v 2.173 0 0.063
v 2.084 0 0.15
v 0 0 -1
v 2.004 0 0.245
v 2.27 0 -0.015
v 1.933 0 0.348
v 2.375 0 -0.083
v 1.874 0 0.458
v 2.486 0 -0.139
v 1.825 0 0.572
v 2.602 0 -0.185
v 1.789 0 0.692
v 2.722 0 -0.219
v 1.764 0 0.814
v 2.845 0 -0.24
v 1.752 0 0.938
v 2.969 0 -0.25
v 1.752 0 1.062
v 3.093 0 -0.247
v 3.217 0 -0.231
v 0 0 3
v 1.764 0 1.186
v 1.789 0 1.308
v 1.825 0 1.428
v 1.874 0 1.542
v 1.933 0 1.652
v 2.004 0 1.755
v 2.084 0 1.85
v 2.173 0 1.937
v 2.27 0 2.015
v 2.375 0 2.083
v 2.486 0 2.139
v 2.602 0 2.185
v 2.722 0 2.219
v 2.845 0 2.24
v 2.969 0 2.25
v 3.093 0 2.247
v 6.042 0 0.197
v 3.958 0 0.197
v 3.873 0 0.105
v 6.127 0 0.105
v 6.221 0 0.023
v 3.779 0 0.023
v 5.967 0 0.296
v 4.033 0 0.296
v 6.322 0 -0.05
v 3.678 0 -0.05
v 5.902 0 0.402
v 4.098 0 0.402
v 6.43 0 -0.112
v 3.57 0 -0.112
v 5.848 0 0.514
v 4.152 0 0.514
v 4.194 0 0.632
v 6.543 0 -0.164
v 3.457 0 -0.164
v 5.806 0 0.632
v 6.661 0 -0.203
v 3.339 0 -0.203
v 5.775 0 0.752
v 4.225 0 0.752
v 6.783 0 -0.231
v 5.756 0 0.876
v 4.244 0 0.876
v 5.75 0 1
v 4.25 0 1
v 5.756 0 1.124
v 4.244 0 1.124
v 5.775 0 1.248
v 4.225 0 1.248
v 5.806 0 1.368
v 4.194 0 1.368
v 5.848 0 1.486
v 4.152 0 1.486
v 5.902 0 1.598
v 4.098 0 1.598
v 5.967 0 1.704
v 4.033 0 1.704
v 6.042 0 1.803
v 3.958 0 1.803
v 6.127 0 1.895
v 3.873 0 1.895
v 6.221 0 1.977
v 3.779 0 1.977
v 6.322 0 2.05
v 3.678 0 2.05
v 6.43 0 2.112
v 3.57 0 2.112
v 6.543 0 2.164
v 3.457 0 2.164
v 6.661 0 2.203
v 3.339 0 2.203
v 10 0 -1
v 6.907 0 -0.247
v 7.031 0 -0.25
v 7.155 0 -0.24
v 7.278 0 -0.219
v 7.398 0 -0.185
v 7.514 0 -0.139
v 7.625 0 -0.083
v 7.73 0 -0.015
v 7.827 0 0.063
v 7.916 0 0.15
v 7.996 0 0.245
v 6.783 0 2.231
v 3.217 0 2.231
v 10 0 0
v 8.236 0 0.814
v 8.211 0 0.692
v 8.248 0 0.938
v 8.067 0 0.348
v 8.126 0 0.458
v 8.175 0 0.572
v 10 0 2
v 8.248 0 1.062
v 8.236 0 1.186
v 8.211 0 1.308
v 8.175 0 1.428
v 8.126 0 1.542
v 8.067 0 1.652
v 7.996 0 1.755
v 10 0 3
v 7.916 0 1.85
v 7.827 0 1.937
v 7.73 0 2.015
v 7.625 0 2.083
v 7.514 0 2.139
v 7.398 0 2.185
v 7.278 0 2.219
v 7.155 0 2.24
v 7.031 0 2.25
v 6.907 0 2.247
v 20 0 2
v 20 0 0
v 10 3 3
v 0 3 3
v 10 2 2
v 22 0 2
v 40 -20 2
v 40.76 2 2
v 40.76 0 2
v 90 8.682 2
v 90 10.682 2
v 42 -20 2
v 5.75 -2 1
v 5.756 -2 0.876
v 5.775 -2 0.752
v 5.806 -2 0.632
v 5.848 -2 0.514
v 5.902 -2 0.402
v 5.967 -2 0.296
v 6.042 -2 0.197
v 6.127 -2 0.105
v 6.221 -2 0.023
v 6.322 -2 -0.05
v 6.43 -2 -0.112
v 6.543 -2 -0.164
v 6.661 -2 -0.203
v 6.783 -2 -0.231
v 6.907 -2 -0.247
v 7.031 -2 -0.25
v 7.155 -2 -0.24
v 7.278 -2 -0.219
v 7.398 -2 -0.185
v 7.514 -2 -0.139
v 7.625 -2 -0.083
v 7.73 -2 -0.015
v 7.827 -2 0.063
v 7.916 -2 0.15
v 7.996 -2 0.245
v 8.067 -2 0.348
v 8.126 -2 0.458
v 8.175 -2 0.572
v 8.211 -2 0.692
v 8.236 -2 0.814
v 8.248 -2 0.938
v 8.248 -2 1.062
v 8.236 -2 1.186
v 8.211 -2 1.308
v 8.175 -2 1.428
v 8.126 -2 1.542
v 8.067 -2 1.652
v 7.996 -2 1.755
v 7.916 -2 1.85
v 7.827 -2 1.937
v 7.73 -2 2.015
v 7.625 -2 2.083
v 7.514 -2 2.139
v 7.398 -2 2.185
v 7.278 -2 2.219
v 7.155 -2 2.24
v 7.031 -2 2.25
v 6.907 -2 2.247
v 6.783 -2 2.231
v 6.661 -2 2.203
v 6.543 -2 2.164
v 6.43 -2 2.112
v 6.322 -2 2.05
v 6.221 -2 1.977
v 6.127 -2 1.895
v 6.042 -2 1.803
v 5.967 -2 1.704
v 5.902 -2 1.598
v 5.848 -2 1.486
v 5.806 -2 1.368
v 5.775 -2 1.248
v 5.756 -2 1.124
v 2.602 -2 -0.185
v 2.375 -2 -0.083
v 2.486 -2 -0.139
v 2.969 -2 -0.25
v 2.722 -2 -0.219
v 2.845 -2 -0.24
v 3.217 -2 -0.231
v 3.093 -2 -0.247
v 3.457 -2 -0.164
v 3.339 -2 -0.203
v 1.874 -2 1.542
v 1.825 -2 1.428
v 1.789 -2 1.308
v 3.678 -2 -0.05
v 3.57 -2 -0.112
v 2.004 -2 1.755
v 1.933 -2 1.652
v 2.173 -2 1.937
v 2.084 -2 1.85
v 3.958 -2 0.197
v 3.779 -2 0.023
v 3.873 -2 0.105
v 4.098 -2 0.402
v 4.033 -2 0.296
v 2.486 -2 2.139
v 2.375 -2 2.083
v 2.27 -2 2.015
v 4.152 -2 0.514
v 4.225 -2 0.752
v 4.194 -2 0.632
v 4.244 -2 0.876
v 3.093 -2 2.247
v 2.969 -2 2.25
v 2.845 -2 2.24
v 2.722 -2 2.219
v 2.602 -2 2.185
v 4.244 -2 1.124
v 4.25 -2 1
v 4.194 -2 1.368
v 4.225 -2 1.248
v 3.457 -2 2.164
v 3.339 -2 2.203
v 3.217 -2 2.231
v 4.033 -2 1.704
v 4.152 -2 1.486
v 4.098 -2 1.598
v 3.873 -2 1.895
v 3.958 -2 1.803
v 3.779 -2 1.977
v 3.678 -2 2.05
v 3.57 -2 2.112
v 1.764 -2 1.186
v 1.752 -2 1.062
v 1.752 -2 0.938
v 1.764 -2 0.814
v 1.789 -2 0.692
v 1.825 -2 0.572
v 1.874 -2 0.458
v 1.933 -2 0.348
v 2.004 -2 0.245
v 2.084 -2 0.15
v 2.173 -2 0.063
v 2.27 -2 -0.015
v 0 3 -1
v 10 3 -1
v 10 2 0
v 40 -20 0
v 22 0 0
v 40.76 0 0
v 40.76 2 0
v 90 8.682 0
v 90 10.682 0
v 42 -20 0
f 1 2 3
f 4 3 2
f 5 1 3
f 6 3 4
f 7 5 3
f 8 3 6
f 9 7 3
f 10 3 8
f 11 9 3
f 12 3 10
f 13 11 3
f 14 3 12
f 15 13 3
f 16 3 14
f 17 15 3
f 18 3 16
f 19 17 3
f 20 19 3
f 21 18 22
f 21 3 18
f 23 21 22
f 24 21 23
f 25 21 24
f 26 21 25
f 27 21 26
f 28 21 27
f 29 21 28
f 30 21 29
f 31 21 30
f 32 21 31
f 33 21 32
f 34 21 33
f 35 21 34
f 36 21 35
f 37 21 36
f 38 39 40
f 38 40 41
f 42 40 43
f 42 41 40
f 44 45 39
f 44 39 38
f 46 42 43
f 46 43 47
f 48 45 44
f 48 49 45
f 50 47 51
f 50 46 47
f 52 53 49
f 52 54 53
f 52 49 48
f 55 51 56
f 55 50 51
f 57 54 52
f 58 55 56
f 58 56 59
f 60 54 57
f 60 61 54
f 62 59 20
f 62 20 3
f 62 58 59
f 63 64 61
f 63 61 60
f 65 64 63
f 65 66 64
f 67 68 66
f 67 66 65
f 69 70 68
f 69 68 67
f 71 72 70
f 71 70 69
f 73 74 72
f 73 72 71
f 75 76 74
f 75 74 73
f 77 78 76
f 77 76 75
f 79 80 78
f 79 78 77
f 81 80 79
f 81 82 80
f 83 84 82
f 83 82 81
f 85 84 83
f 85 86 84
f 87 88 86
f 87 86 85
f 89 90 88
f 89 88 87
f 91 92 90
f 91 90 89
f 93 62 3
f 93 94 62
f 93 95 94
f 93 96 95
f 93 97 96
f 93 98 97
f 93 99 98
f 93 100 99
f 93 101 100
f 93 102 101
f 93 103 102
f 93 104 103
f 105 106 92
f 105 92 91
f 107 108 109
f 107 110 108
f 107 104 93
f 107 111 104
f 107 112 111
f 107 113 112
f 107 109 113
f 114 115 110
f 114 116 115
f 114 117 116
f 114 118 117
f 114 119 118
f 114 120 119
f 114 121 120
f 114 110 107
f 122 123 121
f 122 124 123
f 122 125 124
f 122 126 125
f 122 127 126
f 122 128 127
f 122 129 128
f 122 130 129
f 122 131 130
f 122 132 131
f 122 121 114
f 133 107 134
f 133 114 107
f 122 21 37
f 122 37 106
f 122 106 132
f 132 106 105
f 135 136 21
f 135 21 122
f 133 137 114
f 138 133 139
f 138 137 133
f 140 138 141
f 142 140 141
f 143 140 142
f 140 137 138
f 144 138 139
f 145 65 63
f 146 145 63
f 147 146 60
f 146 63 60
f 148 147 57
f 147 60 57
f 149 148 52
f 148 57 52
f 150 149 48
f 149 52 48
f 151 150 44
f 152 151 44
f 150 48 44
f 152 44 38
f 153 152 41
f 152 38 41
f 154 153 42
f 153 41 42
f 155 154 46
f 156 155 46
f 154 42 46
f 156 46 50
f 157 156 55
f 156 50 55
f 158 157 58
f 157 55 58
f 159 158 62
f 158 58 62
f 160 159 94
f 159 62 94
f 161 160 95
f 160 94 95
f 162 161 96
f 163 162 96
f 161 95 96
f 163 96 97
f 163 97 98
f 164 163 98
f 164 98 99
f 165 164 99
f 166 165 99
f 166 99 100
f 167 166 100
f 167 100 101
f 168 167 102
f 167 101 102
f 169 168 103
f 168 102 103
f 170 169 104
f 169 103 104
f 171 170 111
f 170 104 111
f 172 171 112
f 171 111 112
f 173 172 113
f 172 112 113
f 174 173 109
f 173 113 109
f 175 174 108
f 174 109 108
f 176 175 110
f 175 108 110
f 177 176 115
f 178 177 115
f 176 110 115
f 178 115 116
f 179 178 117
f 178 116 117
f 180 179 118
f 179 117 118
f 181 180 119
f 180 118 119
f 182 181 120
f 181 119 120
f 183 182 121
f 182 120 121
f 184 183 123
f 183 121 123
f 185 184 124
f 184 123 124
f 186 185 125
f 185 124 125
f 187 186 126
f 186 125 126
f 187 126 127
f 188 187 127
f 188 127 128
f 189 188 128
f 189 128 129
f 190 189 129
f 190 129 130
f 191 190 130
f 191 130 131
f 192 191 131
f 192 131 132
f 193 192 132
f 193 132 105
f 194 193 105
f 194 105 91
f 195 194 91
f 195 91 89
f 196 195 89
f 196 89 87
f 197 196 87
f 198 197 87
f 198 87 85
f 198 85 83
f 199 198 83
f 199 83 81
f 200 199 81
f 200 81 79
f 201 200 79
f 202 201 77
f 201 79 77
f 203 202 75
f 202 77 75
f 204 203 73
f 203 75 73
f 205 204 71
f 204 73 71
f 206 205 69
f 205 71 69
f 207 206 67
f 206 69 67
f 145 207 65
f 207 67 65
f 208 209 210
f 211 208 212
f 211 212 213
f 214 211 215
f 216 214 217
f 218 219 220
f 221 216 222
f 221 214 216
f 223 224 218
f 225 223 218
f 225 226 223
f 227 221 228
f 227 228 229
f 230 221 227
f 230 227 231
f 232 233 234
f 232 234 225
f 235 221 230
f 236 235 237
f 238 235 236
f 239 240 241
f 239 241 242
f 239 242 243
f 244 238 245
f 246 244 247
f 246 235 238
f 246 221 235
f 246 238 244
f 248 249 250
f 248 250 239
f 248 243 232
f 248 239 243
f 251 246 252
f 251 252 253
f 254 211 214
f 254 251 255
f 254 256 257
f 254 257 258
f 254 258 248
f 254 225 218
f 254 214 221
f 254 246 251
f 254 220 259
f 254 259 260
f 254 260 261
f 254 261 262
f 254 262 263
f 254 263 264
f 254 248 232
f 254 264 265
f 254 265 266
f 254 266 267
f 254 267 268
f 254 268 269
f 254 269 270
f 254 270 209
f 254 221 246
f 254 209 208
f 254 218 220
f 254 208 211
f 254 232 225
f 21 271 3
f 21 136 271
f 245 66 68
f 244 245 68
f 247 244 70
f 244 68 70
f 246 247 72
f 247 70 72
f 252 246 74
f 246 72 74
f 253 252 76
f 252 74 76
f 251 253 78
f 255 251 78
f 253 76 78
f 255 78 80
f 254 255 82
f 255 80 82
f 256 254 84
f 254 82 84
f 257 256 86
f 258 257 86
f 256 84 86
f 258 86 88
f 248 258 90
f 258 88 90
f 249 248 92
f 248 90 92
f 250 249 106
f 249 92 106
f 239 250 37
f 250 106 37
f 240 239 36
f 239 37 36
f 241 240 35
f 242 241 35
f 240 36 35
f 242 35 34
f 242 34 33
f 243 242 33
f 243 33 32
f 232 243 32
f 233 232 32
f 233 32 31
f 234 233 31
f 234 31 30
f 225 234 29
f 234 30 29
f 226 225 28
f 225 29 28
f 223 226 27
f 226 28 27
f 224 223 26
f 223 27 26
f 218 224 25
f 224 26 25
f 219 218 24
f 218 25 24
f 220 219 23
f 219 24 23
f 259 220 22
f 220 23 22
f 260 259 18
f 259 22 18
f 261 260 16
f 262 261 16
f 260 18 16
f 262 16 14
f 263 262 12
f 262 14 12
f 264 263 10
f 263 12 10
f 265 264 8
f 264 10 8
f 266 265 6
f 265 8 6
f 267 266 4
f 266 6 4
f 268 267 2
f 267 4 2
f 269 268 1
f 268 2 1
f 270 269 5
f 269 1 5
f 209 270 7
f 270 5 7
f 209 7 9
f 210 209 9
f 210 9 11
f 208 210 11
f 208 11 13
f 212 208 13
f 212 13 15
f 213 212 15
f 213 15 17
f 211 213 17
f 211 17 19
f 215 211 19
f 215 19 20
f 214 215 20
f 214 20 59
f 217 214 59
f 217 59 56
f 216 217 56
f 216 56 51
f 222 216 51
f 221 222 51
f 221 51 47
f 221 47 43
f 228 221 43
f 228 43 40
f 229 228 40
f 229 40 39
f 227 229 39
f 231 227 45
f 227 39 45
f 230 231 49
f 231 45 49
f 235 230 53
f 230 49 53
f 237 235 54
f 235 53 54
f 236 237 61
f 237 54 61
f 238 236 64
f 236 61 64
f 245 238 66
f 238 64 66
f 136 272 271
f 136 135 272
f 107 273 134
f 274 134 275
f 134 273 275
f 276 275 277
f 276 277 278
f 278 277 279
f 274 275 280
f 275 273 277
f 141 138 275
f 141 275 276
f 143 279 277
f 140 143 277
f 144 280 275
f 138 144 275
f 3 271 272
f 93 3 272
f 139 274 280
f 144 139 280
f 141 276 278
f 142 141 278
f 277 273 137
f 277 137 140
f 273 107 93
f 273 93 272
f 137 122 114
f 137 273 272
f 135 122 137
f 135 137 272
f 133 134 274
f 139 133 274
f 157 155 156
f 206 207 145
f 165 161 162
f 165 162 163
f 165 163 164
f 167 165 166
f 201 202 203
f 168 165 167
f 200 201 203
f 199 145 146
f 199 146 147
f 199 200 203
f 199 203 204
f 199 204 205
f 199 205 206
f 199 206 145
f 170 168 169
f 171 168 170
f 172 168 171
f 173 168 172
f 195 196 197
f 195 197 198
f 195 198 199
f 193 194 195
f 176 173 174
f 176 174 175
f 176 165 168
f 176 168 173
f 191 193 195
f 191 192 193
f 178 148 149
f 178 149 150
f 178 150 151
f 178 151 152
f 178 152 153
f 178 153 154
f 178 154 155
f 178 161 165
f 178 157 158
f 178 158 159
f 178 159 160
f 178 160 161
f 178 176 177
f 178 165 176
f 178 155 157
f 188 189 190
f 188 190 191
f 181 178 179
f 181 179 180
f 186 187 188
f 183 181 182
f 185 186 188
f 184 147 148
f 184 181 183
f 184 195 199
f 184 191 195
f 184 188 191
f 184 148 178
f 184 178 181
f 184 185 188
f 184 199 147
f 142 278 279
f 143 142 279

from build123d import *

# Parameters (mm, degrees)
F0_W          = 30.7596123494
F0_H          = 2
F1_DEPTH      = 2
F2_DEPTH      = 3
F2_DEPTH_BACK = 1
F4_DEPTH      = 2
F6_DEPTH      = 2


# Not quite as in the source:
# - a feature names something its author has since deleted; it is built from what else it names


with BuildPart() as f1:
    # F0 (on Top) → F1 (new body)
    with BuildSketch(Plane.XY):
        Polygon((40.7596123494, 2), (40.7596123494, 0), (90, 8.6824088833), (90, 10.6824088833), align=None)
        with Locations((25.3798061747, 1)):
            Rectangle(F0_W, F0_H)
    extrude(amount=F1_DEPTH)

    # F0 (on Top) → F2 (join, two sides)
    with BuildSketch(Plane.XY) as f2_sk:
        Polygon((0, 3), (0, 0), (10, 0), (10, 2), (10, 3), align=None)
    extrude(amount=F2_DEPTH)
    extrude(f2_sk.sketch, amount=-F2_DEPTH_BACK)

    # F3 (on face) → F4 (join)
    with BuildSketch(Plane.XZ):
        with BuildLine():
            ThreePointArc((1.75, 1), (3, -0.25), (4.25, 1))
            Line((4.25, 1), (1.75, 1))
        make_face()
        with BuildLine():
            Line((1.75, 1), (4.25, 1))
            ThreePointArc((4.25, 1), (3, 2.25), (1.75, 1))
        make_face()
        with BuildLine():
            ThreePointArc((8.25, 1), (7, 2.25), (5.75, 1))
            Line((5.75, 1), (8.25, 1))
        make_face()
        with BuildLine():
            Line((8.25, 1), (5.75, 1))
            ThreePointArc((5.75, 1), (7, -0.25), (8.25, 1))
        make_face()
    extrude(amount=F4_DEPTH)

    # F5 (on Top) → F6 (join)
    with BuildSketch(Plane.XY):
        Polygon((42, -20), (22, 0), (20, 0), (40, -20), align=None)
    extrude(amount=F6_DEPTH)


solid = f1.part
